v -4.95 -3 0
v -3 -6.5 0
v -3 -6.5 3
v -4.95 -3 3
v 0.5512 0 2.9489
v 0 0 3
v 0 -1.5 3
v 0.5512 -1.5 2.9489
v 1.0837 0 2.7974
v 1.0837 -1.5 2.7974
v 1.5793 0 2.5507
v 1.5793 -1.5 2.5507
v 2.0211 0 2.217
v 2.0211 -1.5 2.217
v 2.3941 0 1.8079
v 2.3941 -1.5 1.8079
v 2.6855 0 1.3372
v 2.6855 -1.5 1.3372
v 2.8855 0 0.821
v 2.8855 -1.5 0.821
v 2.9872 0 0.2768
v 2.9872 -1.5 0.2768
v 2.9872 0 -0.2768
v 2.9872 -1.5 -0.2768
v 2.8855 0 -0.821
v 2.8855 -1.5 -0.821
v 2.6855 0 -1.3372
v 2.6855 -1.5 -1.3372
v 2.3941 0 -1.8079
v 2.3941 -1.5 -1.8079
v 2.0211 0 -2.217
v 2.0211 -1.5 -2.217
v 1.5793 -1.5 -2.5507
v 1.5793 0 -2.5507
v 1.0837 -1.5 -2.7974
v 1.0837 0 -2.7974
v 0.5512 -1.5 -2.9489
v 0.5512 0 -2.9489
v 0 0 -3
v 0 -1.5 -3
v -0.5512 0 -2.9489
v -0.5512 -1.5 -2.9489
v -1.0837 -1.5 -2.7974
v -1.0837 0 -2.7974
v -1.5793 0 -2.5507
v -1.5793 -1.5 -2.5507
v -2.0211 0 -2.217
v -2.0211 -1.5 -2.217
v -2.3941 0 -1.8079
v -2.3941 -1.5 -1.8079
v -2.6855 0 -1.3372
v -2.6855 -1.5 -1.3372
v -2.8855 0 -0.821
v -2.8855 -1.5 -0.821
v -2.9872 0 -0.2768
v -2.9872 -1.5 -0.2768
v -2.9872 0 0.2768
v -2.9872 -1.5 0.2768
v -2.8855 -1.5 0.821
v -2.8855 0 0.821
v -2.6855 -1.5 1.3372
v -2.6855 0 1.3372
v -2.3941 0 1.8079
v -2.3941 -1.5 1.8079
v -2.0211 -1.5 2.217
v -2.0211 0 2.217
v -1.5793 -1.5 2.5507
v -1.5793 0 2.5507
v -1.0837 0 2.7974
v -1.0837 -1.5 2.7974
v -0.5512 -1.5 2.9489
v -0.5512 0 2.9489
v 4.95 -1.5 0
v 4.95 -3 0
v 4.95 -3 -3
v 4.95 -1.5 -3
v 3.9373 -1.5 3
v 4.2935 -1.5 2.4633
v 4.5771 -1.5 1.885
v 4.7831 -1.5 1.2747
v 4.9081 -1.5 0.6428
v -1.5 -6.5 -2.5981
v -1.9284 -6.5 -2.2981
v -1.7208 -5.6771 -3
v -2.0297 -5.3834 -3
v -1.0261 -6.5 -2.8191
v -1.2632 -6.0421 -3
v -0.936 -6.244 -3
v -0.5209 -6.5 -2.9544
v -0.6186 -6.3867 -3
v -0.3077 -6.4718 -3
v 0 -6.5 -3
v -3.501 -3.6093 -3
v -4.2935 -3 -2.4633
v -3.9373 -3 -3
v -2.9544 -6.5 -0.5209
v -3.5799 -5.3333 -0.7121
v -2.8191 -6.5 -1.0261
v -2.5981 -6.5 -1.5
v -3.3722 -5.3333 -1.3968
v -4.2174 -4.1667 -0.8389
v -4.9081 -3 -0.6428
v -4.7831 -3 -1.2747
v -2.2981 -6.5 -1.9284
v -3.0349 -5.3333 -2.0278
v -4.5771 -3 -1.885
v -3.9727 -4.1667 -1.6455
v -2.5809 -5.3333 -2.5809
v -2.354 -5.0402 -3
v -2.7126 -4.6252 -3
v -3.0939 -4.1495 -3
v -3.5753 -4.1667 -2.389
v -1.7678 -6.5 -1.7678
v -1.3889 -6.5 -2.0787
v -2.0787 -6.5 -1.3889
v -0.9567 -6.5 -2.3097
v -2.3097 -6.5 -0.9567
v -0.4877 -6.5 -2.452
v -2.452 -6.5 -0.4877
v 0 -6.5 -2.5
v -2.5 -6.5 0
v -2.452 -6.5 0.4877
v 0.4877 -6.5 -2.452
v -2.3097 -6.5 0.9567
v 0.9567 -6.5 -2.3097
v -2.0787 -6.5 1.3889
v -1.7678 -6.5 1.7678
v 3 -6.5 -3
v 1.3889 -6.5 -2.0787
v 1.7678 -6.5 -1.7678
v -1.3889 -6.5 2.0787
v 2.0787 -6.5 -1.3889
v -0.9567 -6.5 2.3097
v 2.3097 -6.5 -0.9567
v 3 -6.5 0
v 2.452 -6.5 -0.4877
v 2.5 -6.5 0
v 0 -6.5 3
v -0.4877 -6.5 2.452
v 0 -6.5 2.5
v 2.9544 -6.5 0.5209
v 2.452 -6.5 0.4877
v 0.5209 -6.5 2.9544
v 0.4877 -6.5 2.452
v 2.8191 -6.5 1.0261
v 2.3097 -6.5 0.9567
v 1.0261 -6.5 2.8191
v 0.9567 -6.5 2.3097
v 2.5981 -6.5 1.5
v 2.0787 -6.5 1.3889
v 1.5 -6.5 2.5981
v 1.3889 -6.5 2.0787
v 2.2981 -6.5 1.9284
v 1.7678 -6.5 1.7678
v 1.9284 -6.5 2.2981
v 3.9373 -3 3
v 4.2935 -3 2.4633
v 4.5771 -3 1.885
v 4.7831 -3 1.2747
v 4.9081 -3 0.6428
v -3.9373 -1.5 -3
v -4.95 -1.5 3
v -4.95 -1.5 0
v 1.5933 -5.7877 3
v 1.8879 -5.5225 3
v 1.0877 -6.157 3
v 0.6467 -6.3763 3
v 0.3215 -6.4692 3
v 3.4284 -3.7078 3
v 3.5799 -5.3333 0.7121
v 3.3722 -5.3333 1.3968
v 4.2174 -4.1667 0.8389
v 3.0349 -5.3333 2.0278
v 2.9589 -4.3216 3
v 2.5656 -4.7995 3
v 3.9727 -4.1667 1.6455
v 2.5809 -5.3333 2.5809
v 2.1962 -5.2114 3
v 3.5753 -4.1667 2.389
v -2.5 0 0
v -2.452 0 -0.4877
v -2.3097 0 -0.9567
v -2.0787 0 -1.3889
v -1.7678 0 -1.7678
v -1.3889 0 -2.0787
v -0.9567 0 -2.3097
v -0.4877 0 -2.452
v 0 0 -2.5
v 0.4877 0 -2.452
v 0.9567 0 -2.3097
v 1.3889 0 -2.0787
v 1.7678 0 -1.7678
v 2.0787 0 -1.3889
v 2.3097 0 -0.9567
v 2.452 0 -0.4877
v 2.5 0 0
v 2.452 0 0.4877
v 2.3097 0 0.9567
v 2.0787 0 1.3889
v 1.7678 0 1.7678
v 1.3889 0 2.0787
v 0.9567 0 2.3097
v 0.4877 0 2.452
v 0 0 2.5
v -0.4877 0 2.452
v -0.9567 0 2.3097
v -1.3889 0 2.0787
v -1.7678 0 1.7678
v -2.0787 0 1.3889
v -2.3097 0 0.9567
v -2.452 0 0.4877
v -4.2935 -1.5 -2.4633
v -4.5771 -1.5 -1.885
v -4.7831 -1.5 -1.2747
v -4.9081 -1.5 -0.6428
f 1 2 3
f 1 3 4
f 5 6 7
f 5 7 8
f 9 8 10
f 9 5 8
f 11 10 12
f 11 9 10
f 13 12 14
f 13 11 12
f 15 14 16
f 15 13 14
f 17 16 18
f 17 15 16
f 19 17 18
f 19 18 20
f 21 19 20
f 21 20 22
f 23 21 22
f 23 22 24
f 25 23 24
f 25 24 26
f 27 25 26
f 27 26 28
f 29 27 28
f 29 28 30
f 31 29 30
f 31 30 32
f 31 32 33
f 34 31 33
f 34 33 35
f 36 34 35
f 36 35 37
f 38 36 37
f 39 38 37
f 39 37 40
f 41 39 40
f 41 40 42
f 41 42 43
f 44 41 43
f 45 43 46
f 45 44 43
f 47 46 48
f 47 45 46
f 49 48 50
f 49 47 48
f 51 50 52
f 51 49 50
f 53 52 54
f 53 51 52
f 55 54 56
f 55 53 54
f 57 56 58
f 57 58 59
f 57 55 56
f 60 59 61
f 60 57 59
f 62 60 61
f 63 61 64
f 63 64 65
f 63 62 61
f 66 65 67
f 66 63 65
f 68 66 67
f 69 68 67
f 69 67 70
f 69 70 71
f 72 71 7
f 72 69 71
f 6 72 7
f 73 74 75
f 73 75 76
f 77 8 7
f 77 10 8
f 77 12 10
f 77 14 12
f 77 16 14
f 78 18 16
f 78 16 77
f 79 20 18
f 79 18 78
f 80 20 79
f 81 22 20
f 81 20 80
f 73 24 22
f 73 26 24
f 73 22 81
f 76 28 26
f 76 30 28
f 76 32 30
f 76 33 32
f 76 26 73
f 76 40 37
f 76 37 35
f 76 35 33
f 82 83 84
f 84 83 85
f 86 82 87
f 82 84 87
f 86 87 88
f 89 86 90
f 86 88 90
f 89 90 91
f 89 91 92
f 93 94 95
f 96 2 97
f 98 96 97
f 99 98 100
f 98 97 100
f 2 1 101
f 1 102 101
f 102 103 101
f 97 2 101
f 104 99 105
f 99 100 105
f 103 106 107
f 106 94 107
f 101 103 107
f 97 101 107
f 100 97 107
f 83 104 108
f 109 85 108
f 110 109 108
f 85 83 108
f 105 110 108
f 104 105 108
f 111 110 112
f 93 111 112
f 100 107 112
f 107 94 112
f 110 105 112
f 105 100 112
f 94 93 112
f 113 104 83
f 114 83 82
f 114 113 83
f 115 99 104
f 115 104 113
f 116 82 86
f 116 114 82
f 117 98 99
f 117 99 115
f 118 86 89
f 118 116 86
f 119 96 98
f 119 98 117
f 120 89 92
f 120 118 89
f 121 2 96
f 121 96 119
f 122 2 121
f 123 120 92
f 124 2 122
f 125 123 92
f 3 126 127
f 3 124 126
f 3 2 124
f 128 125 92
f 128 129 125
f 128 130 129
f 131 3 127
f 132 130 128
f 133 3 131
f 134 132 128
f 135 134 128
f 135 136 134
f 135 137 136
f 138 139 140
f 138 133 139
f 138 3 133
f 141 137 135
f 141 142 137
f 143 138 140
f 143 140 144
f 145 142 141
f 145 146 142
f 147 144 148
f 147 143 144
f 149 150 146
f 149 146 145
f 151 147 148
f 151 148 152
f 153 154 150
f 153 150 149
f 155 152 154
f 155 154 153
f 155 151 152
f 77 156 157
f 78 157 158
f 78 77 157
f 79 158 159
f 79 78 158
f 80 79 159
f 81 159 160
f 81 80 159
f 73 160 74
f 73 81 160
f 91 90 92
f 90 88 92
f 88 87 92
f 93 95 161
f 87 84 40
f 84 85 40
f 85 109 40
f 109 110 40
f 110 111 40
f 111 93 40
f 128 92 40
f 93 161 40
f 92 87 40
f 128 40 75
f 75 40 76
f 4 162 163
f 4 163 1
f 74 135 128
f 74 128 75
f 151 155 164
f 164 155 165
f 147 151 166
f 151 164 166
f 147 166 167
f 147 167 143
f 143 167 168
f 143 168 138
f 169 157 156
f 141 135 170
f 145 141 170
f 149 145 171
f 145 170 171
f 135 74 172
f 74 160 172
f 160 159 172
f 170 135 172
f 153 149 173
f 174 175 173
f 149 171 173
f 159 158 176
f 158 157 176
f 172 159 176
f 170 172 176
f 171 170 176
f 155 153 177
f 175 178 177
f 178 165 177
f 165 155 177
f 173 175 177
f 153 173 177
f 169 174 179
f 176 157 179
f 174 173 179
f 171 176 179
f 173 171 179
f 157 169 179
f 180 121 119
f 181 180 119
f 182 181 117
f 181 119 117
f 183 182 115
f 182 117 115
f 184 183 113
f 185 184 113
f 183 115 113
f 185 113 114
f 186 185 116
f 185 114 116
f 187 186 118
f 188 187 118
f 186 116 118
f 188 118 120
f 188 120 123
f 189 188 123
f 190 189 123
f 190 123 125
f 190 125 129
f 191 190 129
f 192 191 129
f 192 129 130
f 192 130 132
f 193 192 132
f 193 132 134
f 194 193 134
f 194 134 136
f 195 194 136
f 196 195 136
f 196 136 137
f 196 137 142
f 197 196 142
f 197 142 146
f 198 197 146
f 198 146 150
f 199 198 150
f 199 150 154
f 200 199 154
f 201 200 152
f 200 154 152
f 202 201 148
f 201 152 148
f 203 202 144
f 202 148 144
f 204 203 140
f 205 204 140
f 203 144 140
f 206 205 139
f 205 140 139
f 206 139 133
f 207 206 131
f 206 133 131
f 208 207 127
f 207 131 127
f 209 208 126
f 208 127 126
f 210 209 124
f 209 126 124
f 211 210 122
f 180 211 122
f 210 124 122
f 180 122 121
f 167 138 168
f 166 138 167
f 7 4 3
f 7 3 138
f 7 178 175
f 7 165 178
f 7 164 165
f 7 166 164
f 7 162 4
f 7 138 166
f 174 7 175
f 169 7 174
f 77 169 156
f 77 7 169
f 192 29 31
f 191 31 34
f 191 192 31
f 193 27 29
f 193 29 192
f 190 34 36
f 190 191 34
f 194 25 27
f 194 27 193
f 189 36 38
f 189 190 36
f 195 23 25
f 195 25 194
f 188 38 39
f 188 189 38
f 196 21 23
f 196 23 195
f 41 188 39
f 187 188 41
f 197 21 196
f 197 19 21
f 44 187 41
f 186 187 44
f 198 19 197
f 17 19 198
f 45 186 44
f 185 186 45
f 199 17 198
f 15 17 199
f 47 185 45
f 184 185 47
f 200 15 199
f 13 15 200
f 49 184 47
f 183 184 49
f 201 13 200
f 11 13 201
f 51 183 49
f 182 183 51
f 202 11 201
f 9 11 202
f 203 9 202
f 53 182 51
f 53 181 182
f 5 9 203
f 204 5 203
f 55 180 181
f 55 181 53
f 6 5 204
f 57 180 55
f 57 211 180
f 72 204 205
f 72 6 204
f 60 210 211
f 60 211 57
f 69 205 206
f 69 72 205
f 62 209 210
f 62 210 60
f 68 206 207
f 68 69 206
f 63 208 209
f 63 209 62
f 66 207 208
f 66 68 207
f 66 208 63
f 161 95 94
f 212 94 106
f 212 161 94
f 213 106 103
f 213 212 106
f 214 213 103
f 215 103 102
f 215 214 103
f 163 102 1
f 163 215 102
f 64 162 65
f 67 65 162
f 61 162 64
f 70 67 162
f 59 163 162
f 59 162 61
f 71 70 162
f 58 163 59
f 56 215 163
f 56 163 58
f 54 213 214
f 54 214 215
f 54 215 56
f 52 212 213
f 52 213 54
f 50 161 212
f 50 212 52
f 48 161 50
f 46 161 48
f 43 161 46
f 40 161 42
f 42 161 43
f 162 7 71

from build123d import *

# Parameters (mm, degrees)
EXTRUDE_1_DEPTH       = 3
HOLE_WIZARD_M61_D     = 5
HOLE_WIZARD_M61_DEPTH = 6.5
SKETCH_4_OUTSIDE_W    = 14.556
SKETCH_4_OUTSIDE_H    = 10.656
SKETCH_4_OUTSIDE_R    = 3
CUT_EXTRUDE_1_DEPTH   = 1.5
CUT_EXTRUDE_2_DEPTH   = 6


with BuildPart() as part:
    # Эскиз1 → Бобышка-Вытянуть1 (new body, symmetric)
    with BuildSketch(Plane.XY):
        Polygon((3, 0), (-3, 0), (-3, -1.5), (-4.95, -1.5), (-4.95, -6.5), (4.95, -6.5), (4.95, -1.5), (3, -1.5), align=None)
    extrude(amount=EXTRUDE_1_DEPTH, both=True)

    # Отверстие обработанное метчиком M61
    with Locations(Plane(origin=(0, 0, 0), x_dir=(1, 0, 0), z_dir=(0, 1, 0))):
        with Locations((0, 0)):
            Hole(HOLE_WIZARD_M61_D / 2, depth=HOLE_WIZARD_M61_DEPTH)

    # Эскиз4 outside → Вырез-Вытянуть1 (cut)
    with BuildSketch(Plane(origin=(0, 0, 0), x_dir=(1, 0, 0), z_dir=(0, 1, 0))):
        Rectangle(SKETCH_4_OUTSIDE_W, SKETCH_4_OUTSIDE_H)
        with Locations(Location((0, 0, 0), (0, 0, 270))):  # turned: the seam where the file's is
            Circle(SKETCH_4_OUTSIDE_R, mode=Mode.SUBTRACT)
    extrude(amount=-CUT_EXTRUDE_1_DEPTH, mode=Mode.SUBTRACT)

    # Эскиз5 → Вырез-Вытянуть2 (cut, through all)
    with BuildSketch(Plane(origin=(0, -1.5, 0), x_dir=(1, 0, 0), z_dir=(0, 1, 0))):
        with BuildLine():
            Line((-4.95, 0), (-4.95, 3))
            Line((-4.95, 3), (-3.937321425, 3))
            ThreePointArc((-3.937321425, 3), (-4.690002188, 1.583154912), (-4.95, 0))
        make_face()
        with BuildLine():
            Line((4.95, 0), (4.95, -3))
            Line((4.95, -3), (3.937321425, -3))
            ThreePointArc((3.937321425, -3), (4.690002188, -1.583154912), (4.95, 0))
        make_face()
    extrude(amount=-CUT_EXTRUDE_2_DEPTH, mode=Mode.SUBTRACT)

    # Вырез-По траектории1: sweep along a path in Эскиз7
    with BuildLine(Plane.XZ.offset(6.5)) as sweep_1_path:
        Line((0, 4.95), (-4.95, 4.95))
        Line((-4.95, 4.95), (-4.95, 0))
        ThreePointArc((-4.95, 0), (-3.500178567, -3.500178567), (0, -4.95))
        Line((0, -4.95), (4.95, -4.95))
        Line((4.95, -4.95), (4.95, 0))
        ThreePointArc((4.95, 0), (3.500178567, 3.500178567), (0, 4.95))
    # Эскиз6 → Вырез-По траектории1 (sweep, cut)
    with BuildSketch(Plane.XY.offset(3)):
        Polygon((-4.95, -3), (-4.95, -6.5), (-3, -6.5), align=None)
    sweep(path=sweep_1_path.line, transition=Transition.RIGHT, mode=Mode.SUBTRACT)


solid = part.part
